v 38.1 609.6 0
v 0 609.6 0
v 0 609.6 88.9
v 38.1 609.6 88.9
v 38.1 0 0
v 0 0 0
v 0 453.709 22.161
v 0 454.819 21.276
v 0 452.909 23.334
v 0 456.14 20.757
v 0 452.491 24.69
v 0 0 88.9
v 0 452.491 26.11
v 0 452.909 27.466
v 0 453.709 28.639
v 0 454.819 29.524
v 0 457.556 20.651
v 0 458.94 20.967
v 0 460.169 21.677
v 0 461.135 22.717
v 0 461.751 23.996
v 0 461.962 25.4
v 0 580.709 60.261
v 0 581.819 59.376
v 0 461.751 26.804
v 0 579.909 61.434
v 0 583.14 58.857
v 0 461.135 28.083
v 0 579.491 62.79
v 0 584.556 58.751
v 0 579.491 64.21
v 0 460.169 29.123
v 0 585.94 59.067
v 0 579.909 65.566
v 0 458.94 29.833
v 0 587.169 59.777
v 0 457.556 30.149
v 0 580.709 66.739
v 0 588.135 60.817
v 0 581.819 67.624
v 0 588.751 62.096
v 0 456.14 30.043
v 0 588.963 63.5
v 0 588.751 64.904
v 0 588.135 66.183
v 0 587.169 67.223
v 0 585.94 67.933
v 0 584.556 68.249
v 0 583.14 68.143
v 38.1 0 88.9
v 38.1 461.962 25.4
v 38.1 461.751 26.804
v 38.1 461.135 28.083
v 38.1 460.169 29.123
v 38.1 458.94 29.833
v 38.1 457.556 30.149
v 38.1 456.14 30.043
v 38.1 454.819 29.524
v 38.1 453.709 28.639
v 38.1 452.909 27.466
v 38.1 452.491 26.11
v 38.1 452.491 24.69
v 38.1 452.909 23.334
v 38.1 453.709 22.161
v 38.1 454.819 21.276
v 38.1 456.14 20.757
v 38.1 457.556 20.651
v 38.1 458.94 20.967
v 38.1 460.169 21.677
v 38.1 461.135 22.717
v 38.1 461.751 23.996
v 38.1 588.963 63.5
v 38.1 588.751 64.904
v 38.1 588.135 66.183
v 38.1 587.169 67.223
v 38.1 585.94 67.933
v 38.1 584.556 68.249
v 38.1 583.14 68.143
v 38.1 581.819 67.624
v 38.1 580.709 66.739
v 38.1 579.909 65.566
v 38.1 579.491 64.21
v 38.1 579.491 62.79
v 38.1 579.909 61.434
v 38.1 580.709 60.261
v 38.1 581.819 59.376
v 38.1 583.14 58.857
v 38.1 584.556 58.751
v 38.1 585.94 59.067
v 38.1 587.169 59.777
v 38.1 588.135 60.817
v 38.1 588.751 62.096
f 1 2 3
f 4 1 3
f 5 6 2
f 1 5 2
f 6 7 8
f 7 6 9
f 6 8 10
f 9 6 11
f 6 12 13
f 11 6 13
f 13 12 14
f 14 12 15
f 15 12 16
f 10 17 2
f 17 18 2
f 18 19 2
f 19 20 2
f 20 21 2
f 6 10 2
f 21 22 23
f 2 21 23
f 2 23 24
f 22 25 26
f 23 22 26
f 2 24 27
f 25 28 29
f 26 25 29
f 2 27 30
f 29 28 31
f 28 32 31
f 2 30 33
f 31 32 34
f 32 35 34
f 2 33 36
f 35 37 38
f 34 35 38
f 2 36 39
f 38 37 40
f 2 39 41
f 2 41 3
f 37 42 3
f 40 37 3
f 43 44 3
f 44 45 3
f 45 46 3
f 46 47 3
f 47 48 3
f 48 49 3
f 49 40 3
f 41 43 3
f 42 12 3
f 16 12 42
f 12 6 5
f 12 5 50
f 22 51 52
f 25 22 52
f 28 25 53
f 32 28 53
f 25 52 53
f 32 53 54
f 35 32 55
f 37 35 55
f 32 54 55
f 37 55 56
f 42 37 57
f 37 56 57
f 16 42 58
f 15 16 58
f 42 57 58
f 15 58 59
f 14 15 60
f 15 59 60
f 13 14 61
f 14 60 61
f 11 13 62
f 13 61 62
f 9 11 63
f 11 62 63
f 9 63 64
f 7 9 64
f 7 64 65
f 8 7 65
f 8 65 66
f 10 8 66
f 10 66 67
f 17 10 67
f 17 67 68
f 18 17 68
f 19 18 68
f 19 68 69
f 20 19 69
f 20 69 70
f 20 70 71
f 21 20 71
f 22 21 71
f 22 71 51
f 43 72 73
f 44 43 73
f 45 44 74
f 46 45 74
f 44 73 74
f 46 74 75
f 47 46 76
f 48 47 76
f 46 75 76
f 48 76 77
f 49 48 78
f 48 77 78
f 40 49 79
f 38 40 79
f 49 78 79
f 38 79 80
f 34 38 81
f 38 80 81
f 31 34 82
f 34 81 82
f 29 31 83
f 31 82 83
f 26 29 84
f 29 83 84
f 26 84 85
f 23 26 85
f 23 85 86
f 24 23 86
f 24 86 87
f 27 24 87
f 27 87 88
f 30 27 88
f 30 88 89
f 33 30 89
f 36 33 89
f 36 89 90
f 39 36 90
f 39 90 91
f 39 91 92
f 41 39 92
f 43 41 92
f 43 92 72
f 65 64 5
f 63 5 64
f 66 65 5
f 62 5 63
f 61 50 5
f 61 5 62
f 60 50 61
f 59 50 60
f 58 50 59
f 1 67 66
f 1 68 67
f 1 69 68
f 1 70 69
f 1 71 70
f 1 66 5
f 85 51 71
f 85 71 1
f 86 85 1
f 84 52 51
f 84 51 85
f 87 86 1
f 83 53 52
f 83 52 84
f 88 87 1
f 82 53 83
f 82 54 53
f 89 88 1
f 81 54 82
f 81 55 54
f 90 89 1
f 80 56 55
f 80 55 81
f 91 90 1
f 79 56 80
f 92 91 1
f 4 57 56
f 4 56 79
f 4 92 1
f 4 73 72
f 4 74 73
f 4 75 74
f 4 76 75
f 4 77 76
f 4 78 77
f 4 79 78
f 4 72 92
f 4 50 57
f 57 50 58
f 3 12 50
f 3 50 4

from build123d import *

# Parameters (mm, degrees)
F0_W     = 609.6
F0_H     = 88.9
F1_DEPTH = 38.1
F2_R     = 4.7625
F3_DEPTH = 38.101


with BuildPart() as f1:
    # F0 (on Right) → F1 (new body)
    with BuildSketch(Plane.YZ):
        with Locations((304.8, 44.45)):
            Rectangle(F0_W, F0_H)
    extrude(amount=F1_DEPTH)

    # F2 (on face) → F3 (cut, through all)
    with BuildSketch(Plane.YZ.offset(38.1)):
        with Locations((457.2, 25.4)):
            Circle(F2_R)
        with Locations((584.2, 63.5)):
            Circle(F2_R)
    extrude(amount=-F3_DEPTH, mode=Mode.SUBTRACT)


solid = f1.part
